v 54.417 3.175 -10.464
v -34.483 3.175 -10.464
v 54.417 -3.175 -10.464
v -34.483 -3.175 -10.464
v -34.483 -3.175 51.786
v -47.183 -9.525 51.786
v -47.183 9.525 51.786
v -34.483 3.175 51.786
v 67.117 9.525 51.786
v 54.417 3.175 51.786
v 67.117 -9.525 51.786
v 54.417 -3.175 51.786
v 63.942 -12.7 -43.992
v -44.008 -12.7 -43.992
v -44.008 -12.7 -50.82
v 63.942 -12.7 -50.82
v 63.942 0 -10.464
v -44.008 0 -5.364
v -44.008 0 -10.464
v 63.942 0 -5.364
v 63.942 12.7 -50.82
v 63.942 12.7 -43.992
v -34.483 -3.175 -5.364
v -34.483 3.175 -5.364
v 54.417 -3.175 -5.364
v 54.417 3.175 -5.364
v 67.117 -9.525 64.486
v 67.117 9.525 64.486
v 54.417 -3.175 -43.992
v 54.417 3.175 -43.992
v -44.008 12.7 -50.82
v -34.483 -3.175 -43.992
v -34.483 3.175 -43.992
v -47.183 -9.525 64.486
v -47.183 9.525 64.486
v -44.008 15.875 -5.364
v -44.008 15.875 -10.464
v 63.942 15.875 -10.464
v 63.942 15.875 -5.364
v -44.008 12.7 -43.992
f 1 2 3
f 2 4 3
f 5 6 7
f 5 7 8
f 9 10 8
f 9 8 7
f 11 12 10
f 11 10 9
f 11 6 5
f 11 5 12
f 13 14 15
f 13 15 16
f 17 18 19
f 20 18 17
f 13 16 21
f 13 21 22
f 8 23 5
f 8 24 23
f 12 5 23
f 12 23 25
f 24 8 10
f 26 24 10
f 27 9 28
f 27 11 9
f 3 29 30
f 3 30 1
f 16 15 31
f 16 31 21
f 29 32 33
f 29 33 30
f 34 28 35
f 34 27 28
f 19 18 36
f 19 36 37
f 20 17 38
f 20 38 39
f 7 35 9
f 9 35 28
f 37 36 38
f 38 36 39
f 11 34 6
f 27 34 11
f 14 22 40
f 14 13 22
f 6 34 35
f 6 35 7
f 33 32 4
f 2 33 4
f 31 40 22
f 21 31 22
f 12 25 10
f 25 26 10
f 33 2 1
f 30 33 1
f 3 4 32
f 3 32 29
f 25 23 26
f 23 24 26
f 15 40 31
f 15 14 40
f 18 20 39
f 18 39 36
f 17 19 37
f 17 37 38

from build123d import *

# Parameters (mm, degrees)
F1_DEPTH = 9.525
F0_W     = 88.9
F0_H     = 57.15
F0_H_2   = 33.528
F2_DEPTH = 3.175
F3_DEPTH = 12.7
F4_DEPTH = 15.875


with BuildPart() as f1:
    # F0 (on Front) → F1 (new body, symmetric)
    with BuildSketch(Plane.XZ):
        Polygon((67.117094, 64.48551), (-47.182906, 64.48551), (-47.182906, 51.78551), (-34.482906, 51.78551), (54.417094, 51.78551), (67.117094, 51.78551), align=None)
    extrude(amount=F1_DEPTH, both=True)

    # F0 (on Front) → F2 (join, symmetric)
    with BuildSketch(Plane.XZ):
        with Locations((9.967094, 23.21051)):
            Rectangle(F0_W, F0_H)
        with Locations((9.967094, -27.228124)):
            Rectangle(F0_W, F0_H_2)
    extrude(amount=F2_DEPTH, both=True)


with BuildPart() as f3:
    # F0 (on Front) → F3 (new body, symmetric)
    with BuildSketch(Plane.XZ):
        Polygon((54.417094, -43.992124), (-34.482906, -43.992124), (-44.007906, -43.992124), (-44.007906, -50.819797), (63.942094, -50.819797), (63.942094, -43.992124), align=None)
    extrude(amount=F3_DEPTH, both=True)


with BuildPart() as f4:
    # F0 (on Front) → F4 (new body)
    with BuildSketch(Plane.XZ):
        Polygon((54.417094, -5.36449), (-34.482906, -5.36449), (-44.007906, -5.36449), (-44.007906, -10.464124), (-34.482906, -10.464124), (54.417094, -10.464124), (63.942094, -10.464124), (63.942094, -5.36449), align=None)
    extrude(amount=-F4_DEPTH)


solid = Compound([f1.part, f3.part, f4.part])
